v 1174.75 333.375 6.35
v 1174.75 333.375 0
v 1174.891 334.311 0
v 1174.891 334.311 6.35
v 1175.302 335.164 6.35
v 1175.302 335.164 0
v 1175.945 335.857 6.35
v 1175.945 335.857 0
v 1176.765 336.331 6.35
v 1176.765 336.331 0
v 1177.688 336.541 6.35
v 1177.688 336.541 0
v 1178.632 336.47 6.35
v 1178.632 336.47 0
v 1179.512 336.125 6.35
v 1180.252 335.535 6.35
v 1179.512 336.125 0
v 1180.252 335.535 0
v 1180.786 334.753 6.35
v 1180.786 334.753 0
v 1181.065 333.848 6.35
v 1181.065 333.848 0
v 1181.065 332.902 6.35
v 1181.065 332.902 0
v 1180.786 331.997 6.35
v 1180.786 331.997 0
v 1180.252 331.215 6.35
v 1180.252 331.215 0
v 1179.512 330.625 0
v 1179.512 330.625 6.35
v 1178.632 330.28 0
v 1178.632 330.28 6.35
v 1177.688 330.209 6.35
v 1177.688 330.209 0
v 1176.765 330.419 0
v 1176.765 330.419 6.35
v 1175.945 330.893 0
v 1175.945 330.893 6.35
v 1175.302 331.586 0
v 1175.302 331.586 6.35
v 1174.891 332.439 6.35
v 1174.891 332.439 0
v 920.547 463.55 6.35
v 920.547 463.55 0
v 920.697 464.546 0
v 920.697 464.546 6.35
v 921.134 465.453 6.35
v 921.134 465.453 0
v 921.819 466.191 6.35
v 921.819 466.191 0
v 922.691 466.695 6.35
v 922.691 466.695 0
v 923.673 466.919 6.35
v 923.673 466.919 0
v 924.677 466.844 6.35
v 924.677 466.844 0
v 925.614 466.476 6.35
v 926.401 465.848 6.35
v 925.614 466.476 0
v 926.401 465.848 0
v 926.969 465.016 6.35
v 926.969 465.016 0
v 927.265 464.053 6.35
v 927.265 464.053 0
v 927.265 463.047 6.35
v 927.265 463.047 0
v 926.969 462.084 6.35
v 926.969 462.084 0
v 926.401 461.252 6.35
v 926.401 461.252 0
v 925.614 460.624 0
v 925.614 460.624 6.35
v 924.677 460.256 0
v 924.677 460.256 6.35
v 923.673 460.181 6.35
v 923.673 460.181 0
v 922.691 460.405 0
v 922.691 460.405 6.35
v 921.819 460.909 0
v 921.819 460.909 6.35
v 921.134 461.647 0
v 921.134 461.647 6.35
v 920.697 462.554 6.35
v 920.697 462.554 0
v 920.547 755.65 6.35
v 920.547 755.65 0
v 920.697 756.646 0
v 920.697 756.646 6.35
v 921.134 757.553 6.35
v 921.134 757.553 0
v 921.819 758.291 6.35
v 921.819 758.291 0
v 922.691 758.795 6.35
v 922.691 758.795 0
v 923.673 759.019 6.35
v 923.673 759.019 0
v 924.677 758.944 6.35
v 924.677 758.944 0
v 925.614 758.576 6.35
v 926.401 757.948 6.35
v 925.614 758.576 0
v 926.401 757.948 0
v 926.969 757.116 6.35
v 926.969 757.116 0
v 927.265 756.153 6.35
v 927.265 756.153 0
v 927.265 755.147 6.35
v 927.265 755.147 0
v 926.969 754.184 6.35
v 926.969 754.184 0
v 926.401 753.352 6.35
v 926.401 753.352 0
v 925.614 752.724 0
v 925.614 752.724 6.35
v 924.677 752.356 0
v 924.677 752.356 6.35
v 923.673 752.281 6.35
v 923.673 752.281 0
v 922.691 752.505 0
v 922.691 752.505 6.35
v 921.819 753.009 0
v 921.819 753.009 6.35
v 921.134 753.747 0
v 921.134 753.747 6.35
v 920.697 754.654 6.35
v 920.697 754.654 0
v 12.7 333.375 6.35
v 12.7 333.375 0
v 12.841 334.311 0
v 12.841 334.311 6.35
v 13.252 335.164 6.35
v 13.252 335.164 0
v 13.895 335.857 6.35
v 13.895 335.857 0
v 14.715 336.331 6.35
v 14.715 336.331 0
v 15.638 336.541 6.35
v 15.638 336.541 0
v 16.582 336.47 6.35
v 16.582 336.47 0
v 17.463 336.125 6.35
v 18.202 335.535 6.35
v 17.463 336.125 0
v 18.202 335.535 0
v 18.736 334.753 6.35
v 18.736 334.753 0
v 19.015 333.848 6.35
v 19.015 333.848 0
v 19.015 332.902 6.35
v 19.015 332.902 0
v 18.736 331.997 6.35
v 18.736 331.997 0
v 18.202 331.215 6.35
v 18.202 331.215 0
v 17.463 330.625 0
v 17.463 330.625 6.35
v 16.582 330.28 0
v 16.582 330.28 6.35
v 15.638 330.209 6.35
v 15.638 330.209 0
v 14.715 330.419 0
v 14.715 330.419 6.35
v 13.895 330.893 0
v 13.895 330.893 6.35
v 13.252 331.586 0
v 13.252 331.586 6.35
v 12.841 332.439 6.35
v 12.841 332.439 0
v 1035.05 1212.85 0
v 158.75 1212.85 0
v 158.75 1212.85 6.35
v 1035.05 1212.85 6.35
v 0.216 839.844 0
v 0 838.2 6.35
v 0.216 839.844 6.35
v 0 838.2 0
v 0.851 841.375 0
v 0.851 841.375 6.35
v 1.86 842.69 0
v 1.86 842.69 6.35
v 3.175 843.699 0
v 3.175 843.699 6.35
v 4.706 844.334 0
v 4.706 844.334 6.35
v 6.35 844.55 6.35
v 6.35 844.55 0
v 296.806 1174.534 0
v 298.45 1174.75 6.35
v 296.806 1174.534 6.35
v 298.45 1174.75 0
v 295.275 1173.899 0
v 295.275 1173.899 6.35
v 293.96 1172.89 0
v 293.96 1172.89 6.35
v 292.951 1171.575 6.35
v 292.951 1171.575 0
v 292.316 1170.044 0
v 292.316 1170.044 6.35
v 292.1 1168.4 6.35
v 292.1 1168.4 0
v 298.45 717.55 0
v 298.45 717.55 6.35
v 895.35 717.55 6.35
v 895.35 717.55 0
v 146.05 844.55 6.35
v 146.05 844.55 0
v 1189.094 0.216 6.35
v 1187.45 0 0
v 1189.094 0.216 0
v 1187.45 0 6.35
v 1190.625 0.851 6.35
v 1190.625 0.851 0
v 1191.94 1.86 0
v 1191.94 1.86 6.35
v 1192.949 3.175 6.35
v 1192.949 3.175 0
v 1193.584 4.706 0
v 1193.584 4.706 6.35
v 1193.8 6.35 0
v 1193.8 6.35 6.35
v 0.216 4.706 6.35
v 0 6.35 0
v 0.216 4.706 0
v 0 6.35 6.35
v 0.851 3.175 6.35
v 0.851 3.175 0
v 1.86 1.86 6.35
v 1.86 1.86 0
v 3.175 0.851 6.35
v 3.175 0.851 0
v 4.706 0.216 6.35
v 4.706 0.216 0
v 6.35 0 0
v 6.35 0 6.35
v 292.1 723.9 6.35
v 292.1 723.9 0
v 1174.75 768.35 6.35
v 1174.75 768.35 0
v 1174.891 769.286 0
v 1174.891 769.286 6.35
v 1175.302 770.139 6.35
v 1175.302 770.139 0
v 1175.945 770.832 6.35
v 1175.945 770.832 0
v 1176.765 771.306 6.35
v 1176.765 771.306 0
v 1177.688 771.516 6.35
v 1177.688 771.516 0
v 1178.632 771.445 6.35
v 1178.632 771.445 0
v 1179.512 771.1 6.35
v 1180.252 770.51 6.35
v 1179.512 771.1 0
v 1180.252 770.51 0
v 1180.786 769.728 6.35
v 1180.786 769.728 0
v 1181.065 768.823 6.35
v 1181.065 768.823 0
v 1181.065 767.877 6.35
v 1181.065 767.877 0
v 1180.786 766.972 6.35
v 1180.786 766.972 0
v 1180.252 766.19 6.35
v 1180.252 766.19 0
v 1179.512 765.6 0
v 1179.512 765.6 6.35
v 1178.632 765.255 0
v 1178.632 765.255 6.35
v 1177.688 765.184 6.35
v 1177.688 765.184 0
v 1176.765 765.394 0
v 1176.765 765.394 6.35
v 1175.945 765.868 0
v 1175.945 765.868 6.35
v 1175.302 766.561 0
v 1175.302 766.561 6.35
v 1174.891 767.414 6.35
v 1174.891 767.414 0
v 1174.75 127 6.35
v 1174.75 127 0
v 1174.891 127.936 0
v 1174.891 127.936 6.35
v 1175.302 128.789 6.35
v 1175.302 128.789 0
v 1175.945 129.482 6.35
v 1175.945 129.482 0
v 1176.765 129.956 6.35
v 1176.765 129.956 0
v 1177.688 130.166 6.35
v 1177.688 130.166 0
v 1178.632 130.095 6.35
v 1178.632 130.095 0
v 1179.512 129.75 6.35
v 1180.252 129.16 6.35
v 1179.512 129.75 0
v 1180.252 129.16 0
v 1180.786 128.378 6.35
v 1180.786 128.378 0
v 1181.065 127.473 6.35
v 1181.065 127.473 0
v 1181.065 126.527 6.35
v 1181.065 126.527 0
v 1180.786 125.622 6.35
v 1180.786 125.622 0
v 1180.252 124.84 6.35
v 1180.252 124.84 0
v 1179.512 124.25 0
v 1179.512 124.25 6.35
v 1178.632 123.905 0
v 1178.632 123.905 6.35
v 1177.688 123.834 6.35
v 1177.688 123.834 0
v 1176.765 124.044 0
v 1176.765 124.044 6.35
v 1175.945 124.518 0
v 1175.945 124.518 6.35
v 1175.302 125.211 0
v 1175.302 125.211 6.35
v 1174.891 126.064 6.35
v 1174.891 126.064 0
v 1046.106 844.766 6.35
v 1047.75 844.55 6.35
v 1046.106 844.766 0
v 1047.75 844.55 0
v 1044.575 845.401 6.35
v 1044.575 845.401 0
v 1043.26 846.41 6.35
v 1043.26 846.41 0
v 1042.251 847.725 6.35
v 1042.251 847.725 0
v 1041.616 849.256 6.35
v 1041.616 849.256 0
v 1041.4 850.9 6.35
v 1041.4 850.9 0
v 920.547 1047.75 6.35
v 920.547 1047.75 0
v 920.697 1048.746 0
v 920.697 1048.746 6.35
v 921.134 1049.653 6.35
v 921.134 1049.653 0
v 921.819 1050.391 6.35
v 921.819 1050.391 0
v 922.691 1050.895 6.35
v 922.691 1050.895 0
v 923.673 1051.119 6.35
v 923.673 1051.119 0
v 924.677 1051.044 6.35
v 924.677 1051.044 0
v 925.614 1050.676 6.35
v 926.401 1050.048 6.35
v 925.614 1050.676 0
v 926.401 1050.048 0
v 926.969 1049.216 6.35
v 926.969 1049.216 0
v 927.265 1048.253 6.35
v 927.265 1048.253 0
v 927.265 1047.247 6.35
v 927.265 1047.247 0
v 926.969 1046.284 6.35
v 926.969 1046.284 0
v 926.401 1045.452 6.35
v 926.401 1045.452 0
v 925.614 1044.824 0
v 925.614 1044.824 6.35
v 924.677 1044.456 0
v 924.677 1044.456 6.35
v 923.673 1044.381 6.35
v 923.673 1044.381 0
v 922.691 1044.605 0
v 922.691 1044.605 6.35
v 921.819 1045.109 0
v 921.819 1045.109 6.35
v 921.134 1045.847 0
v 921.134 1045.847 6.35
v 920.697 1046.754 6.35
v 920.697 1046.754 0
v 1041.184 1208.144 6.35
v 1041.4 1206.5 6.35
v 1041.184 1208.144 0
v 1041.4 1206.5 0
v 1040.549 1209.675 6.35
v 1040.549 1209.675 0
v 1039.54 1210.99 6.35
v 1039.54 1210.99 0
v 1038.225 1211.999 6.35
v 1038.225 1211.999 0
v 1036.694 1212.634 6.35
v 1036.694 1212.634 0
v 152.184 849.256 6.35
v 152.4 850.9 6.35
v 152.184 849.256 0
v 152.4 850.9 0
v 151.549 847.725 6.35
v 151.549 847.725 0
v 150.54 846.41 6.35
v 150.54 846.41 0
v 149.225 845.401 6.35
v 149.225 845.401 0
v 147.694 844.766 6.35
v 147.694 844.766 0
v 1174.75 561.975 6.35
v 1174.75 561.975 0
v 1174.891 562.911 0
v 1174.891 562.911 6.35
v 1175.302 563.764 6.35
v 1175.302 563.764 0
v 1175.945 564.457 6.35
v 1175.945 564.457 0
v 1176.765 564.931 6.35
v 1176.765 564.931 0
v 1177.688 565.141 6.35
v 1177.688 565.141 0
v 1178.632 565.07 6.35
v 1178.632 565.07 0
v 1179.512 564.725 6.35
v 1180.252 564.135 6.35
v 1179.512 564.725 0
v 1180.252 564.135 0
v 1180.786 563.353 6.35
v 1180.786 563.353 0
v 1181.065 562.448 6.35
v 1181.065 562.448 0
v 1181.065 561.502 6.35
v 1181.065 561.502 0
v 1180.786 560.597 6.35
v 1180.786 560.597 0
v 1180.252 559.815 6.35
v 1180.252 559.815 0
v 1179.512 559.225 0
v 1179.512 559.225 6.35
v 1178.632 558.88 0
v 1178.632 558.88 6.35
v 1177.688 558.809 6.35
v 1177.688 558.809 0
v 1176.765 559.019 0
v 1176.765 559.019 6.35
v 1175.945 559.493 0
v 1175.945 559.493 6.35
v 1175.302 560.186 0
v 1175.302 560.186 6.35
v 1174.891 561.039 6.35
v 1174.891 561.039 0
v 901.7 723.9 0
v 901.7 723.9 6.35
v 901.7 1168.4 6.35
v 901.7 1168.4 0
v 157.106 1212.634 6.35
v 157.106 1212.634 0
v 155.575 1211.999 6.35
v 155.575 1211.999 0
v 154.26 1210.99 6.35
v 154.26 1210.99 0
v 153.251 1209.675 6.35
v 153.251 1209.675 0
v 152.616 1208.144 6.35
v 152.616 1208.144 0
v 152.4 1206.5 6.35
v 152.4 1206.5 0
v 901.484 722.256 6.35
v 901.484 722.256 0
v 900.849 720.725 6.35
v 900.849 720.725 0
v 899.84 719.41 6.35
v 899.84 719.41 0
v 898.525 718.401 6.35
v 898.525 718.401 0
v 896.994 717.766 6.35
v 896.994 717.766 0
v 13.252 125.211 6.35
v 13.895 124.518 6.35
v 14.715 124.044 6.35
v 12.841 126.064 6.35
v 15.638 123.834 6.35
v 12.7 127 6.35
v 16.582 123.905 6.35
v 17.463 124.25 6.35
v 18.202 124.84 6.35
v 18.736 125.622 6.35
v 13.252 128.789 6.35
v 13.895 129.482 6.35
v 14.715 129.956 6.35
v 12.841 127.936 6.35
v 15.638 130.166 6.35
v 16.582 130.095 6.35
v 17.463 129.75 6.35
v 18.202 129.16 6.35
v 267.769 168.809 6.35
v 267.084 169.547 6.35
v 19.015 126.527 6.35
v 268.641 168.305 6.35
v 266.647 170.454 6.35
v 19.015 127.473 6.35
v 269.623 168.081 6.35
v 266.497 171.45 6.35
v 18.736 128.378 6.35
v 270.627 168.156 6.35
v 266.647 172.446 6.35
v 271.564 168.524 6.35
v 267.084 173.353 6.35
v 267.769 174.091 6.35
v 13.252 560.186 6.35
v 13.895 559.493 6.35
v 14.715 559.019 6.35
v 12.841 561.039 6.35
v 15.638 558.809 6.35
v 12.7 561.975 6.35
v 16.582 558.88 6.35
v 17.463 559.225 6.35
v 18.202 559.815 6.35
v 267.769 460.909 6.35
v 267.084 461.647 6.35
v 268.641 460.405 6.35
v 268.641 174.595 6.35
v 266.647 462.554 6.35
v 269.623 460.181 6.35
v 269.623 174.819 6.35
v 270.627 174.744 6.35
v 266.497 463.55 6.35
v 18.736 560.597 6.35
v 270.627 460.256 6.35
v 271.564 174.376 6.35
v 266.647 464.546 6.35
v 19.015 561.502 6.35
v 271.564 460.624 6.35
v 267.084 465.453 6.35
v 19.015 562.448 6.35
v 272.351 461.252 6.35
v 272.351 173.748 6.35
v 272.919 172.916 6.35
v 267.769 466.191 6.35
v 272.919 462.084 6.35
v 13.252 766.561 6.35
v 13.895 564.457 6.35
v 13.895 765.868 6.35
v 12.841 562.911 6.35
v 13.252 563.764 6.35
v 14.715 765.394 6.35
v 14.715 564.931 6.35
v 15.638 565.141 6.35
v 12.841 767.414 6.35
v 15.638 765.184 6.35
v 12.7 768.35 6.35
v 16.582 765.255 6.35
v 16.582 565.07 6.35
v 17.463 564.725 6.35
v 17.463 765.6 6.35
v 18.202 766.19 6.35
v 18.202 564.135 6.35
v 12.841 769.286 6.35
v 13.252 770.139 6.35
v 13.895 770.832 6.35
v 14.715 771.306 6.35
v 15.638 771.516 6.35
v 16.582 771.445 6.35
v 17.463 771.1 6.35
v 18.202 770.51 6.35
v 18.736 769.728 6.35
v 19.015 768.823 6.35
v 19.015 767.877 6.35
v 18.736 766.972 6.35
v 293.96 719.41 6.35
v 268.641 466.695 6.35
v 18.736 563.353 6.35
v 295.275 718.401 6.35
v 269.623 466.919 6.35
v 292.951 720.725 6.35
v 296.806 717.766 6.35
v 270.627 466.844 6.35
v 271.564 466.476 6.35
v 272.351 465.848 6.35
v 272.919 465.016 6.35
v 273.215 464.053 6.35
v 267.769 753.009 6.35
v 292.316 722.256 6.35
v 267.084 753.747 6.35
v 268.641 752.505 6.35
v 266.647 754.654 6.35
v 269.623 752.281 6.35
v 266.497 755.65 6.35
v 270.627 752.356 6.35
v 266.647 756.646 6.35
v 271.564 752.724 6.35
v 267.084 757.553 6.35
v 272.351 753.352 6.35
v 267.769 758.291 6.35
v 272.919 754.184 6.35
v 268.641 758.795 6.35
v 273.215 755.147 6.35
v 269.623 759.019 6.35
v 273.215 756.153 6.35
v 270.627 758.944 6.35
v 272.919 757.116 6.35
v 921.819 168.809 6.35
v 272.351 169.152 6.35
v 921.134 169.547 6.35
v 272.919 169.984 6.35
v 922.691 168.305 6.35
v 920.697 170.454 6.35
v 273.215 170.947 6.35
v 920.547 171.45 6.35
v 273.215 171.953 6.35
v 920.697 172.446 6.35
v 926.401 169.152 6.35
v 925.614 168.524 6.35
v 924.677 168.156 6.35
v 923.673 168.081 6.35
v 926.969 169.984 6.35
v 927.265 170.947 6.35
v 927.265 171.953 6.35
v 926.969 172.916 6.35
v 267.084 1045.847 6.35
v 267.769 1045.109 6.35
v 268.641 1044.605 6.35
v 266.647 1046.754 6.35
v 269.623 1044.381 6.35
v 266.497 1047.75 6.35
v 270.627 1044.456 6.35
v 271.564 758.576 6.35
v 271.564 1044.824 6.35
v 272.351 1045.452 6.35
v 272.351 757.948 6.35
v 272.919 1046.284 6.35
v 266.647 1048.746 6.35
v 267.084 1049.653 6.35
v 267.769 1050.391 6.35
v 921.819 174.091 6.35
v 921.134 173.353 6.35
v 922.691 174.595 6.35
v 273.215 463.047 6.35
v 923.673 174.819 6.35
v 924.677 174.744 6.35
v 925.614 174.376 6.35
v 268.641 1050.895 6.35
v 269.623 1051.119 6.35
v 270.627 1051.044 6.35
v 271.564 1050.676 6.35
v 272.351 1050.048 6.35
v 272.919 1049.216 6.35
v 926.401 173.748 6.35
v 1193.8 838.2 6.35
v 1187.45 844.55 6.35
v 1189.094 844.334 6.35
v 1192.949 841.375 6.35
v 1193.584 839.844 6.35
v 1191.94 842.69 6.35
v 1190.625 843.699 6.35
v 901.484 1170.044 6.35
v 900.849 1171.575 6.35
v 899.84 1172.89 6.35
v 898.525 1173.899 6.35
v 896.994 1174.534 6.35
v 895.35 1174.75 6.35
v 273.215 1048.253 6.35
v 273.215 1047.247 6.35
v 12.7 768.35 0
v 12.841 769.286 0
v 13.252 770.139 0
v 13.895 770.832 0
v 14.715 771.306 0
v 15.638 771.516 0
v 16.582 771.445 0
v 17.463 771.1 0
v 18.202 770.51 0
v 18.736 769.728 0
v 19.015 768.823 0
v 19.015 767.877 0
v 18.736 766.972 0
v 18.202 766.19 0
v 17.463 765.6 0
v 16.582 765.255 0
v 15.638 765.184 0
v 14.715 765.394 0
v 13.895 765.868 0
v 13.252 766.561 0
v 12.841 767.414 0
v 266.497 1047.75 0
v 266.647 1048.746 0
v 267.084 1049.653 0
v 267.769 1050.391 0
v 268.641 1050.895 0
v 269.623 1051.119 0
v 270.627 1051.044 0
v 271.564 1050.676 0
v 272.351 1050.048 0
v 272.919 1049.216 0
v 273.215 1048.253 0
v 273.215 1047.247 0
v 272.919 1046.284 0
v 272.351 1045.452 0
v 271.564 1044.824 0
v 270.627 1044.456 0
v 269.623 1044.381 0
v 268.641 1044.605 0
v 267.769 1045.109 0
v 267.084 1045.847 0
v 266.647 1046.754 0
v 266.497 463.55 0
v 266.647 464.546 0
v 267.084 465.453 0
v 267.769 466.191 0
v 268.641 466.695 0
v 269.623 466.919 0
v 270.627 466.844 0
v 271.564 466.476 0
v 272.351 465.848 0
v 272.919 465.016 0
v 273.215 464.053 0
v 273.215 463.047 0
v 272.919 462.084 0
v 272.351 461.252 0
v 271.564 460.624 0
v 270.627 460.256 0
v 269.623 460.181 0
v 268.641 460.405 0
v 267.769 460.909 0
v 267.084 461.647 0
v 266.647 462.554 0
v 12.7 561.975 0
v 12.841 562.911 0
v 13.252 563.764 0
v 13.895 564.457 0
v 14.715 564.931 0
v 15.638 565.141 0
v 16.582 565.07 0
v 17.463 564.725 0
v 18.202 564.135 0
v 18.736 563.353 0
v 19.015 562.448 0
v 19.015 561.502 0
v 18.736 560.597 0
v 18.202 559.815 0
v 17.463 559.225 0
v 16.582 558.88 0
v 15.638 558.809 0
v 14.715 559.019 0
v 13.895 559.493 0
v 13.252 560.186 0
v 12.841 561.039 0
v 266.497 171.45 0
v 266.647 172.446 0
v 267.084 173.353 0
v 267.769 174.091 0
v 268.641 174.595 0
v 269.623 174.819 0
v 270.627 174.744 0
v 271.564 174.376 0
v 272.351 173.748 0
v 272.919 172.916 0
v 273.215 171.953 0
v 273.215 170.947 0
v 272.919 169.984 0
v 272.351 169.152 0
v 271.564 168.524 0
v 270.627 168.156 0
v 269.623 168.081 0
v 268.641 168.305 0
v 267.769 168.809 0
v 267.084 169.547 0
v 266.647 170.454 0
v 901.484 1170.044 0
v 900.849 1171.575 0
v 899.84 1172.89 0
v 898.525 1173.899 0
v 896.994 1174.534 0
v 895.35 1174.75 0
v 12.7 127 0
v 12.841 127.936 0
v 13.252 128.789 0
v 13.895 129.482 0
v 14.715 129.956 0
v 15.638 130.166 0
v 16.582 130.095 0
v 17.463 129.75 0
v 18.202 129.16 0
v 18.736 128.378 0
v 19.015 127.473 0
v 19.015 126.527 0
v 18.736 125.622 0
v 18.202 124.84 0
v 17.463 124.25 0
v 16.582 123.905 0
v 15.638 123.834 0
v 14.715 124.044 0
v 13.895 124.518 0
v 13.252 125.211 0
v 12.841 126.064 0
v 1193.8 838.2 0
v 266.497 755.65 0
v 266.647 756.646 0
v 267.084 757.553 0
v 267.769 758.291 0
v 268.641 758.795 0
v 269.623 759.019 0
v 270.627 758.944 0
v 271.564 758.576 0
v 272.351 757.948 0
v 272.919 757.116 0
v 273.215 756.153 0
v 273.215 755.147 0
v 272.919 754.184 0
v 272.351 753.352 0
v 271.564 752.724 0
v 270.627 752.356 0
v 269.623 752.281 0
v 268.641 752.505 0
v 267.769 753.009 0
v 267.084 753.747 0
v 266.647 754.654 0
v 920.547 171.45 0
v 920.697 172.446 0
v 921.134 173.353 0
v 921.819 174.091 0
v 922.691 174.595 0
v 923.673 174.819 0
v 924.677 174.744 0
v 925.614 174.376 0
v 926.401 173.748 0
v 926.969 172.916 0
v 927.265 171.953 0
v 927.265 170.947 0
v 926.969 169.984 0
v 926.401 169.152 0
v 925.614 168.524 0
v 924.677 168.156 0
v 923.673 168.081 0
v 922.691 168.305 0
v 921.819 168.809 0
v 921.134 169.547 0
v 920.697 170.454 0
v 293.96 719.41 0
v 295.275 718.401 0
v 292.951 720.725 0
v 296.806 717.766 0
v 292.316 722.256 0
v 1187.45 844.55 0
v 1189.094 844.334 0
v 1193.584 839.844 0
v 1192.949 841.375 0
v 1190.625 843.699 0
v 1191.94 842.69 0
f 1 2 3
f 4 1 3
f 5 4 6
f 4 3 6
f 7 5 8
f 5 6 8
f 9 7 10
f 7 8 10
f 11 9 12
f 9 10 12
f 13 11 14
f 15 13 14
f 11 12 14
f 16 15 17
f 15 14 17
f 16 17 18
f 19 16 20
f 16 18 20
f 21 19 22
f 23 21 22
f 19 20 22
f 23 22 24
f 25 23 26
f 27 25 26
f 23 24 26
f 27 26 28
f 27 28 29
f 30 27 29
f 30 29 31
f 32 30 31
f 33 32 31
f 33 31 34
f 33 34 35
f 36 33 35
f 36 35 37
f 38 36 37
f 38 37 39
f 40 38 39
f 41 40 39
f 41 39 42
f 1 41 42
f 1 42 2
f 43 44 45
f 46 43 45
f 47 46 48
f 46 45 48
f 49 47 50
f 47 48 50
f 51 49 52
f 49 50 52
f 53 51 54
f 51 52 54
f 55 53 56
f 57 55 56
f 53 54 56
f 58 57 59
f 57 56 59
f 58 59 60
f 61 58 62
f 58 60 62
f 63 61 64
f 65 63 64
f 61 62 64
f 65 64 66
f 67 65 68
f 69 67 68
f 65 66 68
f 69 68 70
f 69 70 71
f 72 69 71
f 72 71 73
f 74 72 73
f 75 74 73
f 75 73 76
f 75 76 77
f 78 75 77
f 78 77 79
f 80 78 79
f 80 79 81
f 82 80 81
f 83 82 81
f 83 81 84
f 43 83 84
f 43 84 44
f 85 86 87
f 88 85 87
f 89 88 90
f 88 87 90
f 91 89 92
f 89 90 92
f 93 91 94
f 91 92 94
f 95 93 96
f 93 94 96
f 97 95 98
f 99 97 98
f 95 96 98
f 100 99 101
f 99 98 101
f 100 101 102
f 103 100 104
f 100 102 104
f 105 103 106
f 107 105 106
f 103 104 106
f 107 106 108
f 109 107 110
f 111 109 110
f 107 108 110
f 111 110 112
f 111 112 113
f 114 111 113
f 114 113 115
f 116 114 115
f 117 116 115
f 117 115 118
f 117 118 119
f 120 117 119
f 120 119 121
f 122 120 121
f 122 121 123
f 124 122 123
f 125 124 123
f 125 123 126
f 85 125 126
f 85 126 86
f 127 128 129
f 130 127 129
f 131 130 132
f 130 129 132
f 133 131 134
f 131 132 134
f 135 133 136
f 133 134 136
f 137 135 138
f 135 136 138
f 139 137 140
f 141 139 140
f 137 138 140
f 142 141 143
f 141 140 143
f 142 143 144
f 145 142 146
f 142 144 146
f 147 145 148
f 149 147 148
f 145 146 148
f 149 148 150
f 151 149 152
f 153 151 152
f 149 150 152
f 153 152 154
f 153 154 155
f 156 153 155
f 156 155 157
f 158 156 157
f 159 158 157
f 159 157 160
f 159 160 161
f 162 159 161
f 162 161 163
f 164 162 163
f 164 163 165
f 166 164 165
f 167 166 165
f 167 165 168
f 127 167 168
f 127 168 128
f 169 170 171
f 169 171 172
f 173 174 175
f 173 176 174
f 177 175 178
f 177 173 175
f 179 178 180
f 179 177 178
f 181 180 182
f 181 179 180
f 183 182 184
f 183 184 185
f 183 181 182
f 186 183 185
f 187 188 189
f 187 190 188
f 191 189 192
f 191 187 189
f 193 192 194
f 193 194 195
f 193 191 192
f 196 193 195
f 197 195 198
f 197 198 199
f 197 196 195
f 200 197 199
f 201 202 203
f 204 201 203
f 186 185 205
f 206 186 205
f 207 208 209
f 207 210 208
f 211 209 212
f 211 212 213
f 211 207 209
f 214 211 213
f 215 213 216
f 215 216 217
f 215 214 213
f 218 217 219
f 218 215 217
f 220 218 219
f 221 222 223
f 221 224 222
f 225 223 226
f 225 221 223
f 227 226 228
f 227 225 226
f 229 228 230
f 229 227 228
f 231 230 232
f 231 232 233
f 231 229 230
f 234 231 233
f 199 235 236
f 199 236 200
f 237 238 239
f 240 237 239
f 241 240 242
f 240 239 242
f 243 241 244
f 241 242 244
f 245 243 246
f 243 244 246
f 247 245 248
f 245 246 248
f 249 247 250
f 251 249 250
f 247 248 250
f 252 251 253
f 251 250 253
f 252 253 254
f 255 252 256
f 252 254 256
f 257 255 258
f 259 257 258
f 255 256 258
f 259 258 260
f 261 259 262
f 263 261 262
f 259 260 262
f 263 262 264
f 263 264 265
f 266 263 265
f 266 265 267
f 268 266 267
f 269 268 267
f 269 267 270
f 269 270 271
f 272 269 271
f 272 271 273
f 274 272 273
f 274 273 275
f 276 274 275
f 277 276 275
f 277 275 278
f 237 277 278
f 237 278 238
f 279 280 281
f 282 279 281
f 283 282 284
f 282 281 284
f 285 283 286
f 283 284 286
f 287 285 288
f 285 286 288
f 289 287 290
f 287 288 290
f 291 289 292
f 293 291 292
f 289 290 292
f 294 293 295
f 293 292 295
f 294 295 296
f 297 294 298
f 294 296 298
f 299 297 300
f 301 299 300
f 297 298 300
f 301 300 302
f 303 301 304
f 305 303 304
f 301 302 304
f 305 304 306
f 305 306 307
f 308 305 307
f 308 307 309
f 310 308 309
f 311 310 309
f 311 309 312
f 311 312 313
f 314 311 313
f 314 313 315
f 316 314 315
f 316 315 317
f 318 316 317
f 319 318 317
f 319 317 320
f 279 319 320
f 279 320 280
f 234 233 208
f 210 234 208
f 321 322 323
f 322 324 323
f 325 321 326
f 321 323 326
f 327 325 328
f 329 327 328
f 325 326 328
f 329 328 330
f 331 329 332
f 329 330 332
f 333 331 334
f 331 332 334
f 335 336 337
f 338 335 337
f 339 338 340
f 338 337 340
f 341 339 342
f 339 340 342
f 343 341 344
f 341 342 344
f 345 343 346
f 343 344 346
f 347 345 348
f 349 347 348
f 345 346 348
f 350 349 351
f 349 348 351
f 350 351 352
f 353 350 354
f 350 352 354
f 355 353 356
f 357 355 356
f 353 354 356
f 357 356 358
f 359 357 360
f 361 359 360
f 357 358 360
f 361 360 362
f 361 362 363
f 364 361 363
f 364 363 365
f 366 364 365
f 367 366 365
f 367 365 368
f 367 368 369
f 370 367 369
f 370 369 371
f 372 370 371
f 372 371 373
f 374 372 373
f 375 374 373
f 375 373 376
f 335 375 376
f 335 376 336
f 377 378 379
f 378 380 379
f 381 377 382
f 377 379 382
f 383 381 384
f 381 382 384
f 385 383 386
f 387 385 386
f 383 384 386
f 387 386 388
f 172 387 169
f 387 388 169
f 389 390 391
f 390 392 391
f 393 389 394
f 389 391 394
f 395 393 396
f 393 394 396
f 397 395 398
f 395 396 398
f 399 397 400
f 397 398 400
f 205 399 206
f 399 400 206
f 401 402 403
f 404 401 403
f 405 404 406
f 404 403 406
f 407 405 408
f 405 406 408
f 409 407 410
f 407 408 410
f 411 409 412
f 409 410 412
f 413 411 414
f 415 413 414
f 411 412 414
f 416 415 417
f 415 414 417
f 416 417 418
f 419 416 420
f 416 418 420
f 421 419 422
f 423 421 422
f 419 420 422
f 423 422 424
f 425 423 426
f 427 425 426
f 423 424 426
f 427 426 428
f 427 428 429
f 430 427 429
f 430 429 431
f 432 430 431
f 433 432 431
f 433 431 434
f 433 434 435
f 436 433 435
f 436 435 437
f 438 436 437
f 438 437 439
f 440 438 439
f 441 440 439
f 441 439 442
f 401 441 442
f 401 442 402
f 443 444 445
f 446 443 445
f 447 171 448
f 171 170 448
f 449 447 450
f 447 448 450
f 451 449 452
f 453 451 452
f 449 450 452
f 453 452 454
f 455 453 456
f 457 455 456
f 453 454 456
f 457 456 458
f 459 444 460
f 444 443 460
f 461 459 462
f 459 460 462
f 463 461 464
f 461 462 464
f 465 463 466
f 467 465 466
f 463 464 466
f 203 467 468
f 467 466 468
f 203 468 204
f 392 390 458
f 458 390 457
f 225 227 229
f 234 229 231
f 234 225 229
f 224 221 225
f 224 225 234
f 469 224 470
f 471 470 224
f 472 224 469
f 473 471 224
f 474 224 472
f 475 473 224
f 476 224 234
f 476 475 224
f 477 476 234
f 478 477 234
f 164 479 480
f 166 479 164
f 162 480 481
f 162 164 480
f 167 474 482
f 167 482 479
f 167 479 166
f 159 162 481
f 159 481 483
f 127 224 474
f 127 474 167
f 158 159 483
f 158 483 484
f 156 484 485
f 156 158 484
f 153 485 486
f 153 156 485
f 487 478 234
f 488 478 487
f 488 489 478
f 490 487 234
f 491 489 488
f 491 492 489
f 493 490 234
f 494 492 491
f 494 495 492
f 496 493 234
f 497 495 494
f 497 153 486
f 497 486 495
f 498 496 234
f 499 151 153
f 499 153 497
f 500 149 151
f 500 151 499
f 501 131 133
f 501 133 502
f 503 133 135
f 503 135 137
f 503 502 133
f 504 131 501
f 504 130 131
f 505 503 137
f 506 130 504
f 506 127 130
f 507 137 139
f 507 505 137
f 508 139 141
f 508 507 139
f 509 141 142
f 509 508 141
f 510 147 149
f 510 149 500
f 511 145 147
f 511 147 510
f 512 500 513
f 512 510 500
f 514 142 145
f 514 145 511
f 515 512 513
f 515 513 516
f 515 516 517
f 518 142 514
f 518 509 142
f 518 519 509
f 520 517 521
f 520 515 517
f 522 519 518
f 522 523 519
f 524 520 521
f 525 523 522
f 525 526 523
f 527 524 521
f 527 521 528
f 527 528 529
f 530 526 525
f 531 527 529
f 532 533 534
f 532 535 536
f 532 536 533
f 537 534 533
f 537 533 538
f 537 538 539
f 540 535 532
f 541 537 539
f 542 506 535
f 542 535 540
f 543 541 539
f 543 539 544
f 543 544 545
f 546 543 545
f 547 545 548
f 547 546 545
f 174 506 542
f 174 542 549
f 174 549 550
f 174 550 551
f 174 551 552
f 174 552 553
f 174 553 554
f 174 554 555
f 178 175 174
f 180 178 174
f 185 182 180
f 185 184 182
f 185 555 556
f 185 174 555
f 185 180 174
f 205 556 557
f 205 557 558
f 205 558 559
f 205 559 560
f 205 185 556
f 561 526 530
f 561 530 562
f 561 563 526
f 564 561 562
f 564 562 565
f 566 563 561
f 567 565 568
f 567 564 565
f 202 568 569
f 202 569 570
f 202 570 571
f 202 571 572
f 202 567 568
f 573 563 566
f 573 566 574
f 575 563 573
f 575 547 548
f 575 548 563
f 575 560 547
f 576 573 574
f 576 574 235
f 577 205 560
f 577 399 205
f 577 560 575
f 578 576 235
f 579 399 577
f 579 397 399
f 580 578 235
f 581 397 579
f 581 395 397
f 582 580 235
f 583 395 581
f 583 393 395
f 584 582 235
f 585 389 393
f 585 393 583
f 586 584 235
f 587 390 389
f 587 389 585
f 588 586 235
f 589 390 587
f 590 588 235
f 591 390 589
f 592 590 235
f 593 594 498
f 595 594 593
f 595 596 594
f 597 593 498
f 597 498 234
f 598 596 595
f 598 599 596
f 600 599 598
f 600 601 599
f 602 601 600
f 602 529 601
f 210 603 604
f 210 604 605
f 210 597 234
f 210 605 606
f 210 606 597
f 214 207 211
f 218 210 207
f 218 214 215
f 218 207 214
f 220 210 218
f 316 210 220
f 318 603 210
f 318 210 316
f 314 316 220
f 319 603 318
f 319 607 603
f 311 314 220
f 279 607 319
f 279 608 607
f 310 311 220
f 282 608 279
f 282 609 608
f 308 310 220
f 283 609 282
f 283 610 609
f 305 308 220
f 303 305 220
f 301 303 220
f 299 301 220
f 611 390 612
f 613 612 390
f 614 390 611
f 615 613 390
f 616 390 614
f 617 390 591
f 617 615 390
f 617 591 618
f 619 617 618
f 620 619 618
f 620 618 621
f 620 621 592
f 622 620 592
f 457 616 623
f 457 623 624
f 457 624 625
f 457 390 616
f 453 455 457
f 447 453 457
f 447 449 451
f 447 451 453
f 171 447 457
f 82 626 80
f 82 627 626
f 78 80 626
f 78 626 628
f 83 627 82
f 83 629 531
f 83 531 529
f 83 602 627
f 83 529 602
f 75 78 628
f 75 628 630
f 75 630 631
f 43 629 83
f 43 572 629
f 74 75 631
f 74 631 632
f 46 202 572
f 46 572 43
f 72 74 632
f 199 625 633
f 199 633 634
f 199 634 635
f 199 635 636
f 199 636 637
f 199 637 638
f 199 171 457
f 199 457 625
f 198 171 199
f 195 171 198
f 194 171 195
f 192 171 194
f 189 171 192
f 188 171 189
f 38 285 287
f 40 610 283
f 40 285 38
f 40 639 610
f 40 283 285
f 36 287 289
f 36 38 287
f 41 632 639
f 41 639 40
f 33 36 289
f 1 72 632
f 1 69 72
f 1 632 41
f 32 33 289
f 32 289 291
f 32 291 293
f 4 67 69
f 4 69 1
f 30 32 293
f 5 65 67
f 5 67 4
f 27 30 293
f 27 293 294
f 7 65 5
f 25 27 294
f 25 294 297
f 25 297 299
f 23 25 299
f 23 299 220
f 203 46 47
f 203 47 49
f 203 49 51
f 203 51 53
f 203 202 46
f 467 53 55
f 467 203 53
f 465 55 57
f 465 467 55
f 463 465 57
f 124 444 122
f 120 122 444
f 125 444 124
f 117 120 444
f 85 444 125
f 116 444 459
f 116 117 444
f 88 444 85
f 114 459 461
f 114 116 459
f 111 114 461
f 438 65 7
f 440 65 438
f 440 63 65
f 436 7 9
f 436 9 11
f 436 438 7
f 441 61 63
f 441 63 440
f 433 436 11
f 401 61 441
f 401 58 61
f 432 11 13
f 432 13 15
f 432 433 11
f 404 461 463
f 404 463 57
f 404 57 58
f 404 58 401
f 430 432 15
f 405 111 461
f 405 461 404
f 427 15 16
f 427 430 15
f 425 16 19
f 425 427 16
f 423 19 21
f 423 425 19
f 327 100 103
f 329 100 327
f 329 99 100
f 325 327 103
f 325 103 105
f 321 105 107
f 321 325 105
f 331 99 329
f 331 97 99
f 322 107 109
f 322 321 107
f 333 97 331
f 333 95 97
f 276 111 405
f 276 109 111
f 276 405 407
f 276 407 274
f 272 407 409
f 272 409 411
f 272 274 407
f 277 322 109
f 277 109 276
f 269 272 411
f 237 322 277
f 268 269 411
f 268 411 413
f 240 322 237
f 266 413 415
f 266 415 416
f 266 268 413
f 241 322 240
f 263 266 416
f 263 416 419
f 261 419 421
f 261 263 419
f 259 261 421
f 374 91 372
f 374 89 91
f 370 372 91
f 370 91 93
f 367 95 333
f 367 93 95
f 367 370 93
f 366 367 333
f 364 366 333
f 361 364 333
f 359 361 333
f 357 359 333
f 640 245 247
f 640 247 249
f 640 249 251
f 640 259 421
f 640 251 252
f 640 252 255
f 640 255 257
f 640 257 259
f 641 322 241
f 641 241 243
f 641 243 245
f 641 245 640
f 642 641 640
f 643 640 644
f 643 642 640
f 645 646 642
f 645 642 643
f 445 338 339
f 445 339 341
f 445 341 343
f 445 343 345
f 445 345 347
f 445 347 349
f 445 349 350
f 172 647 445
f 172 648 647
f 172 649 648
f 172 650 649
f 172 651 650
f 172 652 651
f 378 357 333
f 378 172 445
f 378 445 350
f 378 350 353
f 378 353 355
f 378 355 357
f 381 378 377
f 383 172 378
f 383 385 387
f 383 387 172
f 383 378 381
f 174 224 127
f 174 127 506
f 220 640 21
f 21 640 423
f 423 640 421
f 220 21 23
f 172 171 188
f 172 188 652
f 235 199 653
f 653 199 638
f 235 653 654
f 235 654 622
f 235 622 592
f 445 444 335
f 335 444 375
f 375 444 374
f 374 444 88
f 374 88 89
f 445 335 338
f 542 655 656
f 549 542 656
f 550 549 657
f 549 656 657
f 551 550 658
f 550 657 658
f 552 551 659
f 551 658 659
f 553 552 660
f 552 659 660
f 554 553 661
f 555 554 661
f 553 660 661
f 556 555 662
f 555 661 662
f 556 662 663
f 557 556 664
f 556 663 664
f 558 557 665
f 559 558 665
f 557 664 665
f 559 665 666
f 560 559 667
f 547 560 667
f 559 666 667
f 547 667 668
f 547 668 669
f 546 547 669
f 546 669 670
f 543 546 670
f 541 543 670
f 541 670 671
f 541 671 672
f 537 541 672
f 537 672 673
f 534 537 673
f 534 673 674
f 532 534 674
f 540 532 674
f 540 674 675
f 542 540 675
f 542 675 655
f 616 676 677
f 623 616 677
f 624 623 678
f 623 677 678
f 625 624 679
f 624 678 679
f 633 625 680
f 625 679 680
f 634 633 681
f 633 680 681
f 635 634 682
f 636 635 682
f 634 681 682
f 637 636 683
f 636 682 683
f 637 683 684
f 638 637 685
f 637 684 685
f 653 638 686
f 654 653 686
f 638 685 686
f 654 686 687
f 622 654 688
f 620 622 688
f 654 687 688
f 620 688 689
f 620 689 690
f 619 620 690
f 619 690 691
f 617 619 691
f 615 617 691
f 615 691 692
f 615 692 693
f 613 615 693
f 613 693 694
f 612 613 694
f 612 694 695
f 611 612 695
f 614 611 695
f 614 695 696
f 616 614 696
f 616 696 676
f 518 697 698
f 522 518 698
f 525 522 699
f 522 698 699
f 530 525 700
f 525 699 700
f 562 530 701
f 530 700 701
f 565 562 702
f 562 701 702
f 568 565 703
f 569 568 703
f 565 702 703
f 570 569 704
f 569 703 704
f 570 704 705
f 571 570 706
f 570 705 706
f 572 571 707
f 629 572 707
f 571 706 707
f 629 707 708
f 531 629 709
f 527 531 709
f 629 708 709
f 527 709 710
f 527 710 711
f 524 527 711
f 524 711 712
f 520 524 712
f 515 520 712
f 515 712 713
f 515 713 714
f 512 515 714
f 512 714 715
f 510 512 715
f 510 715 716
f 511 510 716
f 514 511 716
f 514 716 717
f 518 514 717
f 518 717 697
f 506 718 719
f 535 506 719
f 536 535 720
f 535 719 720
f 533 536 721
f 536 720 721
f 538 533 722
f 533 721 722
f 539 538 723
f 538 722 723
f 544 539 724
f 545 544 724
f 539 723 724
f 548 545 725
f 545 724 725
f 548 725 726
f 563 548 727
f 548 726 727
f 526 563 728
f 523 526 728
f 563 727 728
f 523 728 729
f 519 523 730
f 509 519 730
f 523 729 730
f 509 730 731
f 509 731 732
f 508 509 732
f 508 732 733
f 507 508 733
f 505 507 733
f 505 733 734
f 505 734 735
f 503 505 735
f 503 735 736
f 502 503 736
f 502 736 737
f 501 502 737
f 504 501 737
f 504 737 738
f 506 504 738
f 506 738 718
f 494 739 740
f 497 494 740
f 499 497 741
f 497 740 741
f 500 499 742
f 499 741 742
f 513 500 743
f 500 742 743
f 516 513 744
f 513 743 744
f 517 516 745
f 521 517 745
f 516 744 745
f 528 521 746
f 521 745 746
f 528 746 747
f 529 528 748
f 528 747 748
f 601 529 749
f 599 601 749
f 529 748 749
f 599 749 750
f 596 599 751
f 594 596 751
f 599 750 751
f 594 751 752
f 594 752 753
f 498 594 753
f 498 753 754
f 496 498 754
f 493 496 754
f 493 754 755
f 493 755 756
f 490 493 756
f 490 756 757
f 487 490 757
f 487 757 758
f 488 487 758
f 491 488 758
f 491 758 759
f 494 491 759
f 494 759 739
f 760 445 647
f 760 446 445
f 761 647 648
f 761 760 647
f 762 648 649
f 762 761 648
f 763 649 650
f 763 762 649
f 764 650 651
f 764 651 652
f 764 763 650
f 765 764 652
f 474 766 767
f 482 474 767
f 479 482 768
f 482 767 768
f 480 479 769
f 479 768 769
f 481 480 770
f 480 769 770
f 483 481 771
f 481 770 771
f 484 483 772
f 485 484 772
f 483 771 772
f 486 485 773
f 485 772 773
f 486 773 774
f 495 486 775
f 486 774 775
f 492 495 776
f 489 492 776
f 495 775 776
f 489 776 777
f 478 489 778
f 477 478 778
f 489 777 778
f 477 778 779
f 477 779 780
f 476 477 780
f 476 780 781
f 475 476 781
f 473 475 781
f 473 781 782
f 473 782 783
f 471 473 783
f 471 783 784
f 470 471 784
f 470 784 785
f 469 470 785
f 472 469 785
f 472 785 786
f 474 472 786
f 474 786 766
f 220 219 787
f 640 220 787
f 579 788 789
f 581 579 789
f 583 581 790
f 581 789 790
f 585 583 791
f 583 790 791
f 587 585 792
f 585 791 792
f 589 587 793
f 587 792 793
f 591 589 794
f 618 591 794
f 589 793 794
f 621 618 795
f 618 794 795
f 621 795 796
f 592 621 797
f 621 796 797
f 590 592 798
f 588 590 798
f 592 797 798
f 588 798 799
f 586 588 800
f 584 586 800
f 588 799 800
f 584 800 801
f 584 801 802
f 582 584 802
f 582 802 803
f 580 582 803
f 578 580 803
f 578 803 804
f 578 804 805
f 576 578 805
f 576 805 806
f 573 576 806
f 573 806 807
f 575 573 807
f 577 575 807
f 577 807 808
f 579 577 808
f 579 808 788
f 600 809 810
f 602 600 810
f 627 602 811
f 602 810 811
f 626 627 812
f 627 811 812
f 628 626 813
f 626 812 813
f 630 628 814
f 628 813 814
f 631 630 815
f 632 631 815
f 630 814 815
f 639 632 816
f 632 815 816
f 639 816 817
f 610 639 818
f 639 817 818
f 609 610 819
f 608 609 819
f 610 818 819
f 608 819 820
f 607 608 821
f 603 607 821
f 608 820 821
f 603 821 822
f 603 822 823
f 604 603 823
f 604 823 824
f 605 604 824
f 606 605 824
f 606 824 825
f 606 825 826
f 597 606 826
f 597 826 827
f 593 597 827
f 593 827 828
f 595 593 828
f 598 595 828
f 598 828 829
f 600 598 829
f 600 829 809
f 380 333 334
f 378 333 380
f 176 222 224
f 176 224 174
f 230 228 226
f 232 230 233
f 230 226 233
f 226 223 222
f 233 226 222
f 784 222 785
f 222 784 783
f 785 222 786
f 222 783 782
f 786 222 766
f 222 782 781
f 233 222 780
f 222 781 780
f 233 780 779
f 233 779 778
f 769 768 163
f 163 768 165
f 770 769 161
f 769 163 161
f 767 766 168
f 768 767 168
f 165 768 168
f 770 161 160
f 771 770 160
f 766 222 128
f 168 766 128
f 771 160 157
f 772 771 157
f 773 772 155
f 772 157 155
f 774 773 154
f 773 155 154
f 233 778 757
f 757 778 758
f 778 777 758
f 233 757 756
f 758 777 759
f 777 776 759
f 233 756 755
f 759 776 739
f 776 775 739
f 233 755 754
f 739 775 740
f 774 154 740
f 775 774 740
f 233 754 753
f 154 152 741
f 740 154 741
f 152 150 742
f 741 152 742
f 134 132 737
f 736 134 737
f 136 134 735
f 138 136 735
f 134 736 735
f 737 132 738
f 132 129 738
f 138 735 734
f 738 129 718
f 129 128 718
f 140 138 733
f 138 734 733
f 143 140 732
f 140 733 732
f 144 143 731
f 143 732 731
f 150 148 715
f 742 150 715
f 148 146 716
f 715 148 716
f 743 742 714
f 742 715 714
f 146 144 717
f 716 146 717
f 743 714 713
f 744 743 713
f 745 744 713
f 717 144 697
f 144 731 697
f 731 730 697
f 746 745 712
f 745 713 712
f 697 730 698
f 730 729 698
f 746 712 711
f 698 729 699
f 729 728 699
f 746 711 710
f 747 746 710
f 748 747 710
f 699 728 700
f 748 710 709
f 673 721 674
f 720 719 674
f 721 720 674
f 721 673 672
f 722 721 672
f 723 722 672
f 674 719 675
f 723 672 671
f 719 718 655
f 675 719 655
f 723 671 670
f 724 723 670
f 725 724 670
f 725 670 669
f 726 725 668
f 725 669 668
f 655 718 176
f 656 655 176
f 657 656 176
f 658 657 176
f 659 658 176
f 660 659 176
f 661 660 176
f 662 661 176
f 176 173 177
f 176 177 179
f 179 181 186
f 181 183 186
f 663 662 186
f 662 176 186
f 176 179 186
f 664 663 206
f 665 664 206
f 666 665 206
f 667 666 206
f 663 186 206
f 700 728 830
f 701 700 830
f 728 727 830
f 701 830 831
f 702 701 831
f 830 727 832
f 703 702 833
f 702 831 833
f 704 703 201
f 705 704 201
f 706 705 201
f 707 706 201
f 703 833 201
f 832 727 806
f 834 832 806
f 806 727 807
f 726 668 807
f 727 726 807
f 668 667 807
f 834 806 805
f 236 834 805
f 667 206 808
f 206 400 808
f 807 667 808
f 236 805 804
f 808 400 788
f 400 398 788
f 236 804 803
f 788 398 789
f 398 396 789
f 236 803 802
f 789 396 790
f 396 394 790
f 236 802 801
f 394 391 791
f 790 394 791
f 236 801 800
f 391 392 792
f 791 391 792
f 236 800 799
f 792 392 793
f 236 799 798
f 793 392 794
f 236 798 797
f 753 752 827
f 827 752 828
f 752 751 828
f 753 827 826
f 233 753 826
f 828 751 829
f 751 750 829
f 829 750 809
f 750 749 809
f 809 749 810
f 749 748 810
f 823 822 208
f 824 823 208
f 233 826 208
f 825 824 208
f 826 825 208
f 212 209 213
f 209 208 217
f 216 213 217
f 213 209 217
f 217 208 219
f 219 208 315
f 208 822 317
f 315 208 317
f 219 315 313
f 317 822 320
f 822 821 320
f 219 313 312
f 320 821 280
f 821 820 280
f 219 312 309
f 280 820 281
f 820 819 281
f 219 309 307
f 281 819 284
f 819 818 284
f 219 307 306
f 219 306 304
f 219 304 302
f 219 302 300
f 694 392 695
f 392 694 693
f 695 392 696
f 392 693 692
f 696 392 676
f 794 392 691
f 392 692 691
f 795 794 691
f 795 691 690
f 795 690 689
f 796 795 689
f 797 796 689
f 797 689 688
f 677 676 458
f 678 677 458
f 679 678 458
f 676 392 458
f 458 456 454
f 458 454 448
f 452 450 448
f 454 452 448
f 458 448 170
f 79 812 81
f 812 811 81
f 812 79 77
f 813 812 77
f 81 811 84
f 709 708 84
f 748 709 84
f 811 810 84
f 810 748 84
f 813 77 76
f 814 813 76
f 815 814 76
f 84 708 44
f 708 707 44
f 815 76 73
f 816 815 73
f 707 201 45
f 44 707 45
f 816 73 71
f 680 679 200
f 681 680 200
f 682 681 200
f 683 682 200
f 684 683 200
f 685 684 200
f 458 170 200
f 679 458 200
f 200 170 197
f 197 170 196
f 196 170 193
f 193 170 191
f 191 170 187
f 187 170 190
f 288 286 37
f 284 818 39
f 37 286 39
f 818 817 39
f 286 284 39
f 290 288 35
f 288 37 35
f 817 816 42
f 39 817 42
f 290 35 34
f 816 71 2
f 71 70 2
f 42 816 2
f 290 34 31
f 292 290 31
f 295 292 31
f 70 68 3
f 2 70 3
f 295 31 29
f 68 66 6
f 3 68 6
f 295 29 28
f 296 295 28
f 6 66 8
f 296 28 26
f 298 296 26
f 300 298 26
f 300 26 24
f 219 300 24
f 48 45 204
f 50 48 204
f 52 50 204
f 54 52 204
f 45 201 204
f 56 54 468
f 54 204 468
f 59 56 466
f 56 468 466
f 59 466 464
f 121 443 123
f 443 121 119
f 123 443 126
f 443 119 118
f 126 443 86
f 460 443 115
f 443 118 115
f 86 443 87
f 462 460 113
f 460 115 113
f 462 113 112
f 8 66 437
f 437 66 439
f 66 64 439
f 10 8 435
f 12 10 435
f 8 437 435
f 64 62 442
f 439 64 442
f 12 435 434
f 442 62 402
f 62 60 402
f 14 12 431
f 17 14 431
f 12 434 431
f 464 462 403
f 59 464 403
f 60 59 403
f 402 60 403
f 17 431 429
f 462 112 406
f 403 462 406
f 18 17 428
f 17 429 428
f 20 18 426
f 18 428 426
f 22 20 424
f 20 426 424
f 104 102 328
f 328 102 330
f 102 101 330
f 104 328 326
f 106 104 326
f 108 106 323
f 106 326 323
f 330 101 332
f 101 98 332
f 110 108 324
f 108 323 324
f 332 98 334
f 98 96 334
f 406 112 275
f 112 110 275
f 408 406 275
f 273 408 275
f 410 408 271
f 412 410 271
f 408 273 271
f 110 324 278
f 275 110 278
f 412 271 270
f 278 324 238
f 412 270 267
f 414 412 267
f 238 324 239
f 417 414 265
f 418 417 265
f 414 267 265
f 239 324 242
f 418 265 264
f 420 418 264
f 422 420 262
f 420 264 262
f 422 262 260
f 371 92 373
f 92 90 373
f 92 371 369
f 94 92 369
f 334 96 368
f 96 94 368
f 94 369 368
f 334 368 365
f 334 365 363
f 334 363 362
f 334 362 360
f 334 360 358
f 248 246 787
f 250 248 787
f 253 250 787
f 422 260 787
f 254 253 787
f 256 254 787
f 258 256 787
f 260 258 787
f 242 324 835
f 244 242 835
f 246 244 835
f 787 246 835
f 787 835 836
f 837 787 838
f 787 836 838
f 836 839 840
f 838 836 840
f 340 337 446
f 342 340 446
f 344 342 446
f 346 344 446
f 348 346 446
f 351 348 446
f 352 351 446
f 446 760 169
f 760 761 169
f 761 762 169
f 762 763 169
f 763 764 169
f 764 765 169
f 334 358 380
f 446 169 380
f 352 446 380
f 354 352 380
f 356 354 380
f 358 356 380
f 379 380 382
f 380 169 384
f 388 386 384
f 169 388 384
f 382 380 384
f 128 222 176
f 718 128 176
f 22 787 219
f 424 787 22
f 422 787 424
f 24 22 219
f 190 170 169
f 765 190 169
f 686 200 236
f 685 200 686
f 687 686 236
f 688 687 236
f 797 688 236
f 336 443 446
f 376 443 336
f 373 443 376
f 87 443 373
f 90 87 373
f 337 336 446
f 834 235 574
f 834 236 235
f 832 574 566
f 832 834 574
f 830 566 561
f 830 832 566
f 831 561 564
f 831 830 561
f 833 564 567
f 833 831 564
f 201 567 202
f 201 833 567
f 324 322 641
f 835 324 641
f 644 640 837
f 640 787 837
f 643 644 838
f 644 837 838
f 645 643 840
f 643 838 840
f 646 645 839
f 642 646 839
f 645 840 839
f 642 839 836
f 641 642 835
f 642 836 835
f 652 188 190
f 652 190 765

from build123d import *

# Parameters (mm, degrees)
SKETCH1_W                   = 1193.8
SKETCH1_H                   = 1212.85
BOSS_EXTRUDE1_DEPTH         = 6.35
SKETCH2_W                   = 609.6
SKETCH2_H                   = 457.2
CUT_EXTRUDE1_DEPTH          = 1702.823693865
SKETCH3_W                   = 152.4
SKETCH3_H                   = 330.2
CUT_EXTRUDE2_DEPTH          = 1702.823693865
F_1_4_0_25_DIAMETER_HOLE1_D = 6.35
F_1_4_CLEARANCE_HOLE1_D     = 6.7564
SKETCH8_W                   = 152.4
SKETCH8_H                   = 38.1
CUT_EXTRUDE3_DEPTH          = 1702.823693865
FILLET1_R                   = 6.35


with BuildPart() as part:
    # Sketch1 → Boss-Extrude1 (new body)
    with BuildSketch(Plane.XY):
        with Locations((596.9, 606.425)):
            Rectangle(SKETCH1_W, SKETCH1_H)
    extrude(amount=BOSS_EXTRUDE1_DEPTH)

    # Sketch2 → Cut-Extrude1 (cut, through all)
    with BuildSketch(Plane.XY.offset(6.35)):
        with Locations((596.9, 946.15)):
            Rectangle(SKETCH2_W, SKETCH2_H)
    extrude(amount=-CUT_EXTRUDE1_DEPTH, mode=Mode.SUBTRACT)

    # Sketch3 → Cut-Extrude2 (cut, through all)
    with BuildSketch(Plane.XY.offset(6.35)):
        with Locations((76.2, 1009.65)):
            Rectangle(SKETCH3_W, SKETCH3_H)
        with Locations((1117.6, 1009.65)):
            Rectangle(SKETCH3_W, SKETCH3_H)
    extrude(amount=-CUT_EXTRUDE2_DEPTH, mode=Mode.SUBTRACT)

    # 1/4 (0.25) Diameter Hole1 (through all)
    with Locations(Plane.XY.offset(6.35)):
        with Locations((15.875, 127), (15.875, 333.375), (15.875, 561.975), (15.875, 768.35), (1177.925, 768.35), (1177.925, 561.975), (1177.925, 333.375), (1177.925, 127)):
            Hole(F_1_4_0_25_DIAMETER_HOLE1_D / 2)

    # 1/4 Clearance Hole1 (through all)
    with Locations(Plane.XY.offset(6.35)):
        with Locations((923.925, 1047.75), (269.875, 1047.75), (269.875, 755.65), (269.875, 463.55), (269.875, 171.45), (923.925, 171.45), (923.925, 463.55), (923.925, 755.65)):
            Hole(F_1_4_CLEARANCE_HOLE1_D / 2)

    # Sketch8 → Cut-Extrude3 (cut, through all)
    with BuildSketch(Plane.XY.offset(6.35)):
        with Locations((76.2, 1193.8)):
            Rectangle(SKETCH8_W, SKETCH8_H)
        with Locations((1117.6, 1193.8)):
            Rectangle(SKETCH8_W, SKETCH8_H)
    extrude(amount=-CUT_EXTRUDE3_DEPTH, mode=Mode.SUBTRACT)

    # Fillet1
    fillet1_edges = [part.edges().sort_by_distance(p)[0] for p in [
        (152.4, 1212.85, 3.175),
        (1041.4, 1212.85, 3.175),
        (292.1, 717.55, 3.175),
        (292.1, 1174.75, 3.175),
        (901.7, 1174.75, 3.175),
        (901.7, 717.55, 3.175),
        (0, 844.55, 3.175),
        (152.4, 844.55, 3.175),
        (1193.8, 844.55, 3.175),
        (1041.4, 844.55, 3.175),
        (1193.8, 0, 3.175),
        (0, 0, 3.175),
    ]]
    fillet(fillet1_edges, radius=FILLET1_R)


solid = part.part
